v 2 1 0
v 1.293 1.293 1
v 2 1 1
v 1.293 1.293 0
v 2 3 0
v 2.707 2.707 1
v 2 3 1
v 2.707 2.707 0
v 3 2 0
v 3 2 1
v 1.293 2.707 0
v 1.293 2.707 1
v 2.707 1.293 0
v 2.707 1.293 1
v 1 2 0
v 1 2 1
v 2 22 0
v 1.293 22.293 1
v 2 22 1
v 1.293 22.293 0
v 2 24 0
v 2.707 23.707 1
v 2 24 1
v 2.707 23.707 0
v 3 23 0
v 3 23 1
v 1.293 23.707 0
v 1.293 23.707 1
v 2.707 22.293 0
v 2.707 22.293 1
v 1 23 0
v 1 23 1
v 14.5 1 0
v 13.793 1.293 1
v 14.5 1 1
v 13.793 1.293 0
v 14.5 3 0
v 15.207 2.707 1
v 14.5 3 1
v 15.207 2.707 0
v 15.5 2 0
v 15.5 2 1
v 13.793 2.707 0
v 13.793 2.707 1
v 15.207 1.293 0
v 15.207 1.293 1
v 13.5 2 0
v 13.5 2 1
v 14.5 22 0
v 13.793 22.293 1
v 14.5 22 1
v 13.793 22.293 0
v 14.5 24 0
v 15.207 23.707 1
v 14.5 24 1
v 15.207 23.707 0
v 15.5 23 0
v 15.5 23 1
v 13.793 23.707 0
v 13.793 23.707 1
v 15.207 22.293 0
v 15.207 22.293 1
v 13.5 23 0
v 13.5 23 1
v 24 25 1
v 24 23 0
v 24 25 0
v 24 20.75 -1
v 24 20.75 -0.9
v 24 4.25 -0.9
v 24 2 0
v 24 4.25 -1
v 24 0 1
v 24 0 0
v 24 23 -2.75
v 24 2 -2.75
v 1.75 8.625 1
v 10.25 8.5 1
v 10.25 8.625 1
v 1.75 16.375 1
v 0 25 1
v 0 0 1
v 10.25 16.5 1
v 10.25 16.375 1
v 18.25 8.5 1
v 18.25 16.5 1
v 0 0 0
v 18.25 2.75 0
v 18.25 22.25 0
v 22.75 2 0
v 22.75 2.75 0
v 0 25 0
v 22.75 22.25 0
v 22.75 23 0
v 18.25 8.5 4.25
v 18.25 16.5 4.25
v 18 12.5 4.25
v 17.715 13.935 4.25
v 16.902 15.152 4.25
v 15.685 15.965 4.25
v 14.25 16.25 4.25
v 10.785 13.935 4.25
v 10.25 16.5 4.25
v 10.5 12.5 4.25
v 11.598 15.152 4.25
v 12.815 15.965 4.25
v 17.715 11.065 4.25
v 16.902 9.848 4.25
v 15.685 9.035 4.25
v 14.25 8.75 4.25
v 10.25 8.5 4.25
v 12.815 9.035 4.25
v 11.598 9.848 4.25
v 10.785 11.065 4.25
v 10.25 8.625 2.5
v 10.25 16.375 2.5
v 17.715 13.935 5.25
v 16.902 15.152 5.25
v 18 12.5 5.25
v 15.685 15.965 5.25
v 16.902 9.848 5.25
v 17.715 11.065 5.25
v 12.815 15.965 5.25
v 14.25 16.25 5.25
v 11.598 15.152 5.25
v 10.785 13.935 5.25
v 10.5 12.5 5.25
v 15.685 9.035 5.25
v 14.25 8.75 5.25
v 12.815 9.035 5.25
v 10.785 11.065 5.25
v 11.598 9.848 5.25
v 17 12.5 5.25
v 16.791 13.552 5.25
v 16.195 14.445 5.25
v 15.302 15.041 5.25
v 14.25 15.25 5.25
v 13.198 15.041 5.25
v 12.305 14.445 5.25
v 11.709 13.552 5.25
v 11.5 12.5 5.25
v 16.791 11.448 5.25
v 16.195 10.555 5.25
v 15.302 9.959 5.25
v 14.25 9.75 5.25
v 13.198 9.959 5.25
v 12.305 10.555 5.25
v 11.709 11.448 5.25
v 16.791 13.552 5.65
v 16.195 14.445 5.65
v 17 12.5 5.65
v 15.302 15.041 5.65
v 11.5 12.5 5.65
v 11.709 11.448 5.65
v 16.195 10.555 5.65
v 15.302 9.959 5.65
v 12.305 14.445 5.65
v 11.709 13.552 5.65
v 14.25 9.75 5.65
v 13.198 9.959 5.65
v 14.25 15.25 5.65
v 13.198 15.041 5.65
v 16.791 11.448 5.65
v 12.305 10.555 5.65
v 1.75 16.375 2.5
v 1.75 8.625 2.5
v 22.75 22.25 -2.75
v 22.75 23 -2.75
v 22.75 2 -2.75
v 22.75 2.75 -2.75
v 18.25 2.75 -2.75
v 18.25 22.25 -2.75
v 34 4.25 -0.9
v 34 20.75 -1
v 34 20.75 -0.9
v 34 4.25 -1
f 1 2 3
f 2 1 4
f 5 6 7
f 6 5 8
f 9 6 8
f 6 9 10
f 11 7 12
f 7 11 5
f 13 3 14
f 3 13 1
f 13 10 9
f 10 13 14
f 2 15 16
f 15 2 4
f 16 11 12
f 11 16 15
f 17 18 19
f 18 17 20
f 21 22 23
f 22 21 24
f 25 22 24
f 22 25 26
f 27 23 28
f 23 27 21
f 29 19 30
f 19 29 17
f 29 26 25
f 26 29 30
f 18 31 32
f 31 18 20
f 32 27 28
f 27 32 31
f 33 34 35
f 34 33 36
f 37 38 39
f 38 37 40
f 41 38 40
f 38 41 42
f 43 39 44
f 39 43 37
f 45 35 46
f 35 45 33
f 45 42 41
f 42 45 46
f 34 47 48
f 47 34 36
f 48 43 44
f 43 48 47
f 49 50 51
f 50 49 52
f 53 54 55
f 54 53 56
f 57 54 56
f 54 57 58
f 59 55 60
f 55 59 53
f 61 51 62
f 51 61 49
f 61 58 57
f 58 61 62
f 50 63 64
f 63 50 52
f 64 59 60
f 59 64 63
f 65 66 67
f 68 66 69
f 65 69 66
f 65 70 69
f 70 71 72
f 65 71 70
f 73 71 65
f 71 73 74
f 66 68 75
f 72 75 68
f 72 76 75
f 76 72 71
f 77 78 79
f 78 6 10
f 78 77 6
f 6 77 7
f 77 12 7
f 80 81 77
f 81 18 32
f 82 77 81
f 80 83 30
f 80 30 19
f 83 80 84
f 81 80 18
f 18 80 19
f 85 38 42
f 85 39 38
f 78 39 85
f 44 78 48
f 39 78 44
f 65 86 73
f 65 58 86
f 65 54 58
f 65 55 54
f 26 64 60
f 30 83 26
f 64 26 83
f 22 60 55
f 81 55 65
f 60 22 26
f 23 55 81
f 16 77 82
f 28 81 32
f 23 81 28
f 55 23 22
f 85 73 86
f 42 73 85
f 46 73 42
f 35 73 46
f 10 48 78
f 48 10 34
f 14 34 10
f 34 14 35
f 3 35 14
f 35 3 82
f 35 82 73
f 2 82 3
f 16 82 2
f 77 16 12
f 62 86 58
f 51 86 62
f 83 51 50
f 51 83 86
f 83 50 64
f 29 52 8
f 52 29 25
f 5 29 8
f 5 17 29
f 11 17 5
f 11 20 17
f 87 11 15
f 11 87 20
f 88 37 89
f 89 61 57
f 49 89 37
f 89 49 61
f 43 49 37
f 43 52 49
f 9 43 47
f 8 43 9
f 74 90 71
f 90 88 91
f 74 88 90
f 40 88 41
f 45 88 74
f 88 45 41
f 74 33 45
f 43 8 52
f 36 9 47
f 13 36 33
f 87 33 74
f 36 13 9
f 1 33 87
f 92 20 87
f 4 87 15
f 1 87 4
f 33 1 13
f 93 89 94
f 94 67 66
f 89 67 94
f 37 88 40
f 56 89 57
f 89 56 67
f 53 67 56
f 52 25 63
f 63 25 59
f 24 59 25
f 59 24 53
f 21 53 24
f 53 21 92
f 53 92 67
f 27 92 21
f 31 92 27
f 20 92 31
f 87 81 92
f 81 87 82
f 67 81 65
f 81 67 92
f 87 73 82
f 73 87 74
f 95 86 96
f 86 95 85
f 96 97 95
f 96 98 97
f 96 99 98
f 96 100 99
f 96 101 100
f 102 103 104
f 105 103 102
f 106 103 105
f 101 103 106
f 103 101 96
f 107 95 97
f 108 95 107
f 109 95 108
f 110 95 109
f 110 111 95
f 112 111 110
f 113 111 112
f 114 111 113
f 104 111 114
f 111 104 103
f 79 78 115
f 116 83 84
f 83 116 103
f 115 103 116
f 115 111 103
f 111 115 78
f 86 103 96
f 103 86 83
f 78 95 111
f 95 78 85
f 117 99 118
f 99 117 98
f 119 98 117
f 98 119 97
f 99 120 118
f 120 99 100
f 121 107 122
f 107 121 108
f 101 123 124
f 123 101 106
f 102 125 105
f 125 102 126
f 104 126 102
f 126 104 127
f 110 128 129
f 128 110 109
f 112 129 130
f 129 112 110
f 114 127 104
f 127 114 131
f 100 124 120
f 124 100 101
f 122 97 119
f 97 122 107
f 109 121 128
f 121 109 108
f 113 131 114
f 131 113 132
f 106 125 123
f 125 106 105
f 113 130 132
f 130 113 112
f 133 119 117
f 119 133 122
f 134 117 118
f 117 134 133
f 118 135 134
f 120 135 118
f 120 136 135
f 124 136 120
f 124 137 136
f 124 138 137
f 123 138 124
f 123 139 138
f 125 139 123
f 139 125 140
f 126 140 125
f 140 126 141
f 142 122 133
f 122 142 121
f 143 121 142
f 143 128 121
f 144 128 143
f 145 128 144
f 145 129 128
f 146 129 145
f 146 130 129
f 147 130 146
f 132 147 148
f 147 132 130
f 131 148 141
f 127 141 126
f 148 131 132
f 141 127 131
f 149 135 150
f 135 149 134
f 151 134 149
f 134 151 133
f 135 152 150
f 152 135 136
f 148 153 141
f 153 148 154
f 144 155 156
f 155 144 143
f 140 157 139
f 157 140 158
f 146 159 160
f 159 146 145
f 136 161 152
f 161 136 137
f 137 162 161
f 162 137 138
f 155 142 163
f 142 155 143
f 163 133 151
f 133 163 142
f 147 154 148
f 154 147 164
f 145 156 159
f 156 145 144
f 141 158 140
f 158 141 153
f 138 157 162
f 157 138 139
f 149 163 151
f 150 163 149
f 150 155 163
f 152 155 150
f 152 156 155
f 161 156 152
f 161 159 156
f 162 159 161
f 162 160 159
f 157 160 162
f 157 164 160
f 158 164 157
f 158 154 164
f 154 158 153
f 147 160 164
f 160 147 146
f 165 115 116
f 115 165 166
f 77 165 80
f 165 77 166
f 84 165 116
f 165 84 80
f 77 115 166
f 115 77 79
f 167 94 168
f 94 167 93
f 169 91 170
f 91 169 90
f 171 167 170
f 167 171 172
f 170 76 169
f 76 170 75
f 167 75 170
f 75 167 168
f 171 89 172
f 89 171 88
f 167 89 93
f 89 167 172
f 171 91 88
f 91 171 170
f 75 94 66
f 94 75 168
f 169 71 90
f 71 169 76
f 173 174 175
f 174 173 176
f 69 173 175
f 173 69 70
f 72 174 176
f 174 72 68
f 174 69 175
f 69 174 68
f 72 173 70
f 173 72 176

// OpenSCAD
// Raspberry Pi Camera - OpenSCAD
//
// License: CC BY-SA 2.0
// https://creativecommons.org/licenses/by-sa/2.0/legalcode
//
// This case was designed for the Rasperry Pi 1 Model B, because that
// the one i had lying around for this project. I power it via the pin
// header 5V pin using a DC-DC buck converter and an external 9V DC
// power supply. The camera ribbon cable is slighly skewed inside the
// case, because I wanted the case to be small and it doesn't line up
// well.

module rpi_camera() {
     color("darkblue")
	  difference() {
	  cube([24,25,1]);
      for ( i = [2,14.5], j=[2,23])
	  translate([i,j,-1]) cylinder(d=2,h=3,$fn=8);
     }
     color("DimGray") union() {
	  translate([10.25,8.5,1]) cube([8,8,3.25]);
	  translate([10.25+4,12.5,1+3.25]) cylinder(d=7.5,h=1,$fn=16);
	  translate([10.25+4,12.5,1+3.25+0.7]) cylinder(d=5.5,h=0.7,$fn=16);
     }
     color("orange") translate([1.75,8.625,1]) cube([8.5,7.75,1.5]);
     color("brown") translate([24-5.75,2.75,-2.75]) cube([4.5,19.5,2.75]);
     color("black") translate([22.75,2,-2.75]) cube([1.25,21,2.75]);
     color("grey") translate([24,4.25,-1]) cube([10,16.5,0.1]);
}
rpi_camera();
